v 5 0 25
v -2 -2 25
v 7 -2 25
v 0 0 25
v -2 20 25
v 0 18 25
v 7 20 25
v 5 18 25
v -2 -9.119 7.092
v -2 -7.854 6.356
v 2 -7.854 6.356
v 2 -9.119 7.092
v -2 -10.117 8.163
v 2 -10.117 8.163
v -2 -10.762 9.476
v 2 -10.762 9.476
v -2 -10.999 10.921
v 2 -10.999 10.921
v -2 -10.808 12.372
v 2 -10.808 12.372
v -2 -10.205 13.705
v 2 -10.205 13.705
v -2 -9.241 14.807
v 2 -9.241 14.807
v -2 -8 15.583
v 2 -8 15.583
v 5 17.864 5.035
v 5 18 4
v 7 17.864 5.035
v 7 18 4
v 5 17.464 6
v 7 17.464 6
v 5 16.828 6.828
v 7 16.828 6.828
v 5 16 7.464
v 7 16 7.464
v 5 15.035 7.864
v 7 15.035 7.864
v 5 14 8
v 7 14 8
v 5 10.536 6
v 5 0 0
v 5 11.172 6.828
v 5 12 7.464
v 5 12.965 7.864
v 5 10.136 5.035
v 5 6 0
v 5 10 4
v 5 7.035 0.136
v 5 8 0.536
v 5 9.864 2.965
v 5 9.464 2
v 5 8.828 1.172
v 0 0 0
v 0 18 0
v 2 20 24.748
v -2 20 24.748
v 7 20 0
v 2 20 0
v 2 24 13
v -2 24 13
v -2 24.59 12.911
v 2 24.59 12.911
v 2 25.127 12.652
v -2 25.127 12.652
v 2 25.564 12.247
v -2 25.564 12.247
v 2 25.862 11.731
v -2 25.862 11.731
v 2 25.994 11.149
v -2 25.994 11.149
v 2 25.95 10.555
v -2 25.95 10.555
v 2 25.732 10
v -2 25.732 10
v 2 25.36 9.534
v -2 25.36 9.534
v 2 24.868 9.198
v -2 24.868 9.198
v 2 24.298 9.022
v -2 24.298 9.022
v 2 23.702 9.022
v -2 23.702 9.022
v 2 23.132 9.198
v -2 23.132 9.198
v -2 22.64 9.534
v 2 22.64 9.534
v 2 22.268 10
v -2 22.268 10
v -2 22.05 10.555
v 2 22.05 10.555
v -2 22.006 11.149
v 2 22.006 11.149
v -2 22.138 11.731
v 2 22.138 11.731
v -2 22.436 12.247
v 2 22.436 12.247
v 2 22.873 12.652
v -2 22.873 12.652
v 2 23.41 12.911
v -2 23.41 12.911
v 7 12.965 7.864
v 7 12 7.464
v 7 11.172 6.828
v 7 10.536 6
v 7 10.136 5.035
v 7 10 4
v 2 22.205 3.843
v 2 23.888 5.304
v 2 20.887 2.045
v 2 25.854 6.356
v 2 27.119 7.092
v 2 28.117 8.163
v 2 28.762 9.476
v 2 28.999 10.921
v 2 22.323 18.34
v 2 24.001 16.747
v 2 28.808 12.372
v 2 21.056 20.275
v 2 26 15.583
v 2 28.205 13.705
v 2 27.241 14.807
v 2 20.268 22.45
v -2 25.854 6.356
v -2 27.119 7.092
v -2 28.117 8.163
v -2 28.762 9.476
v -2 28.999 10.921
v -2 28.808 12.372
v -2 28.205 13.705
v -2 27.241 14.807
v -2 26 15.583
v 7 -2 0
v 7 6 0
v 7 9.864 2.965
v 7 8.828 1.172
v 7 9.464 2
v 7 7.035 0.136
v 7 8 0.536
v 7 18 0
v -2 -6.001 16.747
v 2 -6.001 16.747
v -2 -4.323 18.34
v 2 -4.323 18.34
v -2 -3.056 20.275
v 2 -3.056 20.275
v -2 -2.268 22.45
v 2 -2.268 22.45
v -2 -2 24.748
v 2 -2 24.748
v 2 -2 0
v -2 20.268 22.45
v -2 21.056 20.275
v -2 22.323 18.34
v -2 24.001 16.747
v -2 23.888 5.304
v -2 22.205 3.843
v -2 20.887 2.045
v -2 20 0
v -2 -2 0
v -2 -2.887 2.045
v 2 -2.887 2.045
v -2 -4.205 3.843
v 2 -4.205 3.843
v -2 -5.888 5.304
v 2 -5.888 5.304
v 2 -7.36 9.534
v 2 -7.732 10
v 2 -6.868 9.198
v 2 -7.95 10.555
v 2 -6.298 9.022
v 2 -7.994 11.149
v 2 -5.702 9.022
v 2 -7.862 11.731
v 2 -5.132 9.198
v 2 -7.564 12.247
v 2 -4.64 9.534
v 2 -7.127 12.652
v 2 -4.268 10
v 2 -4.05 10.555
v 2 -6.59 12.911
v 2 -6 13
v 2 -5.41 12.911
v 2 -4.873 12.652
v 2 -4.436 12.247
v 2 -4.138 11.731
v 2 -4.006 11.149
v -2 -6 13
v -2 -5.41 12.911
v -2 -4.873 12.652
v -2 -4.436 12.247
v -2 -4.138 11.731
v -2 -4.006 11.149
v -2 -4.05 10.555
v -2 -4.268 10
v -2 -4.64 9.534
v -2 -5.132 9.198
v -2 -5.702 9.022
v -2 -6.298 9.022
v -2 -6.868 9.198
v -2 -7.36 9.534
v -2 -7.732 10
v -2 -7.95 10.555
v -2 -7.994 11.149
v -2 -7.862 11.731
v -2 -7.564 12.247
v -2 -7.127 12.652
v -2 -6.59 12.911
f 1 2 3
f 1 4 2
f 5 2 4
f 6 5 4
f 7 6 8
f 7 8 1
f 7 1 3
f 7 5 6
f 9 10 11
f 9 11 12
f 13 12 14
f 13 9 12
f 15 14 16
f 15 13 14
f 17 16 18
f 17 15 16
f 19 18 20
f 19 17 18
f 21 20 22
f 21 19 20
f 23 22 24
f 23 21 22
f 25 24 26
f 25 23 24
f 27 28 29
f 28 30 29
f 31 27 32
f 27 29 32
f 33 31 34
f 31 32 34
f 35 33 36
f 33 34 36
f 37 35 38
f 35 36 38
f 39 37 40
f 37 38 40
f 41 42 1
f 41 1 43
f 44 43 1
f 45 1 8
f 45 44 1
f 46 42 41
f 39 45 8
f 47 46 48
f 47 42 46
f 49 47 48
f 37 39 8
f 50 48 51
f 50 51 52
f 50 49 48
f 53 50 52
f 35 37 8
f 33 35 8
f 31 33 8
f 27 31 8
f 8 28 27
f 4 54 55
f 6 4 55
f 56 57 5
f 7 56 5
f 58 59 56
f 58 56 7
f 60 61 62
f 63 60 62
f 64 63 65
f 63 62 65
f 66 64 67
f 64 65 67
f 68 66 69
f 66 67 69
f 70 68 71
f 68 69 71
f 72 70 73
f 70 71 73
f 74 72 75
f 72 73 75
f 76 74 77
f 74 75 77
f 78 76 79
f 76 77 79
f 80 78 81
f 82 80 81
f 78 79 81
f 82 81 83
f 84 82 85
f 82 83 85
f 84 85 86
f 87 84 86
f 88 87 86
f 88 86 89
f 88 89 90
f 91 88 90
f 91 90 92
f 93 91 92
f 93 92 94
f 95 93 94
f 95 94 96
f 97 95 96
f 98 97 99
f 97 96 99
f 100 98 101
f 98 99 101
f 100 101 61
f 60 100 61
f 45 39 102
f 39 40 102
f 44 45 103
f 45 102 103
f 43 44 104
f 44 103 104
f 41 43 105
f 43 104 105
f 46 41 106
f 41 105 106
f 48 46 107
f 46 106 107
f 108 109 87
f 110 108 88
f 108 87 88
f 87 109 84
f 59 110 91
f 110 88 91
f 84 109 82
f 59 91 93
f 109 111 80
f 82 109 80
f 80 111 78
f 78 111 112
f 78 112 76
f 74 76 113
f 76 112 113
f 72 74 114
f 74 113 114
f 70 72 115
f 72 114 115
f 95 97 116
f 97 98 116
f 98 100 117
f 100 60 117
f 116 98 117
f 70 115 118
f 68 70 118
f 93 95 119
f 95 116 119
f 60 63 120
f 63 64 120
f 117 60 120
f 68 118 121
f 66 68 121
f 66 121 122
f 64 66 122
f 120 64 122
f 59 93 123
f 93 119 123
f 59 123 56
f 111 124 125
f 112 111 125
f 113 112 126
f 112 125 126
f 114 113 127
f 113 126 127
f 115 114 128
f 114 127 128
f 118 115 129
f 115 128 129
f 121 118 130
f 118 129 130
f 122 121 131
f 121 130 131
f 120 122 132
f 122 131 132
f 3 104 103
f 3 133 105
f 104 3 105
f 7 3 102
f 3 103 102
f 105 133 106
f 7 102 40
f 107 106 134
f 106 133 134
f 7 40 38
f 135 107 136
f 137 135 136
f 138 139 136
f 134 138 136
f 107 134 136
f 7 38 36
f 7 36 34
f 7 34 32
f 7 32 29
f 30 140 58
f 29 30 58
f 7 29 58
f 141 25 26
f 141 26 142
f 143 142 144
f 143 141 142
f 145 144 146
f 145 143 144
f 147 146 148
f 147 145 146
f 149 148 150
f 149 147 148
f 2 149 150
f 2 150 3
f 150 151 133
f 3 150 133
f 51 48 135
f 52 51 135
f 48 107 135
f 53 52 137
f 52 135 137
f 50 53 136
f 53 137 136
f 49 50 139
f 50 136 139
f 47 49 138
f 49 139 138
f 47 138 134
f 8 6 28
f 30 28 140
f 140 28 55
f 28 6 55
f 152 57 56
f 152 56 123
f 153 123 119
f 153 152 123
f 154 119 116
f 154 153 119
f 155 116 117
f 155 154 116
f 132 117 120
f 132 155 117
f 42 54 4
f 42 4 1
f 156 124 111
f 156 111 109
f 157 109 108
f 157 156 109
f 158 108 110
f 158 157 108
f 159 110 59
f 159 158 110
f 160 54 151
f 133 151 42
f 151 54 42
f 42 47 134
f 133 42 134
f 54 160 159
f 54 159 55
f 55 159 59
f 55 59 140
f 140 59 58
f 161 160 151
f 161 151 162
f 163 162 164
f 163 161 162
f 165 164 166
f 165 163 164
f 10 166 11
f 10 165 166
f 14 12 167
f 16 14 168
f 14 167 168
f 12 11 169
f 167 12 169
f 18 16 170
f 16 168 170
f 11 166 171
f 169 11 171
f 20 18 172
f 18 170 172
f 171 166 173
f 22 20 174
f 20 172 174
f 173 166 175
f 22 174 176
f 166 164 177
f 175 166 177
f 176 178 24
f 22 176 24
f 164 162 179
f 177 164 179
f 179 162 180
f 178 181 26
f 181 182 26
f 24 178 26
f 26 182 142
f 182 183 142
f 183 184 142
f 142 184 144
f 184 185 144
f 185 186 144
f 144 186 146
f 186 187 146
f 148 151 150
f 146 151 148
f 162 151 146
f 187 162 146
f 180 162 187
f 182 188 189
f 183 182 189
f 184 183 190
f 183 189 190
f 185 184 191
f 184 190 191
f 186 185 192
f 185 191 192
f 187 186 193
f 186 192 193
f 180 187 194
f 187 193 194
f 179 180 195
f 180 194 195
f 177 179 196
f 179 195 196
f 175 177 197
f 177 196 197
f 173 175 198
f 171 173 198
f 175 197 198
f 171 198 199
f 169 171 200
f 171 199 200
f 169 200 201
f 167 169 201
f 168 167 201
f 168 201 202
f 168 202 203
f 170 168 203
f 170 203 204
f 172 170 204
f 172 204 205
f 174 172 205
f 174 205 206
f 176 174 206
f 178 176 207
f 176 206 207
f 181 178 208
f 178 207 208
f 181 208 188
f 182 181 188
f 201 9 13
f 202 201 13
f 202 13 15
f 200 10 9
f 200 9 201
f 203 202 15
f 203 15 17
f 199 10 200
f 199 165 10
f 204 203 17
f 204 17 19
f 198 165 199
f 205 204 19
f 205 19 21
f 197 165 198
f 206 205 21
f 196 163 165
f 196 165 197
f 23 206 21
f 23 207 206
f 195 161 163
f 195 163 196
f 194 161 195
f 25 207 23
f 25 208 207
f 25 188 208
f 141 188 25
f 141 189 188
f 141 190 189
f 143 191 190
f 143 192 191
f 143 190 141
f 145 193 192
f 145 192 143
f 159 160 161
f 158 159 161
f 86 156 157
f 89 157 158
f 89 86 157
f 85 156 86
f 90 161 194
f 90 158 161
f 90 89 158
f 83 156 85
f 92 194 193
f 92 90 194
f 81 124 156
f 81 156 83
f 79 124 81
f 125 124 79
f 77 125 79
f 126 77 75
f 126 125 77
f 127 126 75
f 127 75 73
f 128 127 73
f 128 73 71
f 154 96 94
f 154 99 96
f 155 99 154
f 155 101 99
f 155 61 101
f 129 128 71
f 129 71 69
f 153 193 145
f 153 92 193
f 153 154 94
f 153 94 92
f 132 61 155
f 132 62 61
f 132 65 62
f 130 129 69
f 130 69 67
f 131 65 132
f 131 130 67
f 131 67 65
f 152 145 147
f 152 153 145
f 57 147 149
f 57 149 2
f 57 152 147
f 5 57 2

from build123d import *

# Parameters (mm, degrees)
ESQUISSE1_W             = 9
ESQUISSE1_H             = 22
ESQUISSE1_W_2           = 5
ESQUISSE1_H_2           = 18
BOSS_EXTRU_1_DEPTH      = 25
ESQUISSE2_R             = 2
BOSS_EXTRU_2_DEPTH      = 4
CONG_1_R                = 10
ESQUISSE3_W             = 8
ESQUISSE3_H             = 8
ENL_V_MAT_EXTRU_1_DEPTH = 39.923000912
CONG_2_R                = 4


# Some blends are built 0.0001 mm under size
with BuildPart() as part:
    # Esquisse1 → Boss.-Extru.1 (new body)
    with BuildSketch(Plane.XY):
        with Locations((2.5, 9)):
            Rectangle(ESQUISSE1_W, ESQUISSE1_H)
        with Locations((2.5, 9)):
            Rectangle(ESQUISSE1_W_2, ESQUISSE1_H_2, mode=Mode.SUBTRACT)
    extrude(amount=BOSS_EXTRU_1_DEPTH)

    # Esquisse2 → Boss.-Extru.2 (add)
    # profile 1 of 2: a face of its own
    with BuildSketch(Plane.ZY.offset(2)):
        with BuildLine():
            Line((6, -2), (6, -6))
            ThreePointArc((6, -6), (11, -11), (16, -6))
            Line((16, -6), (16, -2))
            Line((16, -2), (6, -2))
        make_face()
        with Locations((11, -6)):
            Circle(ESQUISSE2_R, mode=Mode.SUBTRACT)
    # profile 2 of 2: a face of its own
    with BuildSketch(Plane.ZY.offset(2)):
        with BuildLine():
            Line((6, 20), (6, 24))
            ThreePointArc((6, 24), (11, 29), (16, 24))
            Line((16, 24), (16, 20))
            Line((16, 20), (6, 20))
        make_face()
        with Locations((11, 24)):
            Circle(ESQUISSE2_R, mode=Mode.SUBTRACT)
    extrude(amount=-BOSS_EXTRU_2_DEPTH)

    # Congé1
    # the kernel refuses this fillet: 10 mm, written as the material it adds along each edge
    with BuildSketch(Plane(origin=(-2, -2, 16), x_dir=(0, 0, 1), z_dir=(1, 0, 0))) as cong_1_piece_1:
        with BuildLine():
            CenterArc((8.747727085, 10), CONG_1_R, 203.578178478, 66.421821522)
            Line((-0.417424305, 6), (-1.333939444, 5.6))
            ThreePointArc((-1.333939444, 5.6), (-1, 4), (-1, 0))
            Line((-1, 0), (0, -1))
            Line((0, -1), (8.747727085, -1))
            Line((8.747727085, -1), (8.747727085, 0))
        make_face()
    extrude(amount=4)
    with BuildSketch(Plane(origin=(-2, 20, 16), x_dir=(0, 0, 1), z_dir=(1, 0, 0))) as cong_1_piece_2:
        with BuildLine():
            CenterArc((8.747727085, -10), CONG_1_R, 90, 66.421821522)
            Line((-0.417424305, -6), (-1.333939444, -5.6))
            ThreePointArc((-1.333939444, -5.6), (-1, -4), (-1, 0))
            Line((-1, 0), (0, 1))
            Line((0, 1), (8.747727085, 1))
            Line((8.747727085, 1), (8.747727085, 0))
        make_face()
    extrude(amount=4)
    with BuildSketch(Plane(origin=(-2, -2, 6), x_dir=(0, 0, -1), z_dir=(1, 0, 0))) as cong_1_piece_3:
        with BuildLine():
            CenterArc((8.931185798, -9.560760944), CONG_1_R, 107.044753414, 51.195378821)
            Line((-0.356271401, -5.853586981), (-1.285017121, -5.482869585))
            ThreePointArc((-1.285017121, -5.482869585), (-1, -4), (-1, 0))
            Line((-1, 0), (0, 1))
            ThreePointArc((0, 1), (3, 1), (5.70688142, 0.956076094))
            Line((5.70688142, 0.956076094), (6, 0))
        make_face()
    extrude(amount=4)
    with BuildSketch(Plane(origin=(-2, 20, 6), x_dir=(0, 0, -1), z_dir=(1, 0, 0))) as cong_1_piece_4:
        with BuildLine():
            CenterArc((8.931185798, 9.560760944), CONG_1_R, 201.759867765, 51.195378821)
            Line((-0.356271401, 5.853586981), (-1.285017121, 5.482869585))
            ThreePointArc((-1.285017121, 5.482869585), (-1, 4), (-1, 0))
            Line((-1, 0), (0, -1))
            ThreePointArc((0, -1), (3, -1), (5.70688142, -0.956076094))
            Line((5.70688142, -0.956076094), (6, 0))
        make_face()
    extrude(amount=4)

    # Esquisse3 → Enlèv. mat.-Extru.1 (cut, through all)
    with BuildSketch(Plane(origin=(0, 0, 0), x_dir=(0, 0, -1), z_dir=(1, 0, 0))):
        with Locations((-4, 14)):
            Rectangle(ESQUISSE3_W, ESQUISSE3_H)
    extrude(amount=ENL_V_MAT_EXTRU_1_DEPTH, mode=Mode.SUBTRACT)

    # Congé2
    cong_2_edges = [part.edges().sort_by_distance(p)[0] for p in [
        (6, 10, 0),
        (6, 10, 8),
        (6, 18, 8),
    ]]
    fillet(cong_2_edges, radius=CONG_2_R - 0.0001)  # a hair under: the kernel refuses the full size


solid = part.part
